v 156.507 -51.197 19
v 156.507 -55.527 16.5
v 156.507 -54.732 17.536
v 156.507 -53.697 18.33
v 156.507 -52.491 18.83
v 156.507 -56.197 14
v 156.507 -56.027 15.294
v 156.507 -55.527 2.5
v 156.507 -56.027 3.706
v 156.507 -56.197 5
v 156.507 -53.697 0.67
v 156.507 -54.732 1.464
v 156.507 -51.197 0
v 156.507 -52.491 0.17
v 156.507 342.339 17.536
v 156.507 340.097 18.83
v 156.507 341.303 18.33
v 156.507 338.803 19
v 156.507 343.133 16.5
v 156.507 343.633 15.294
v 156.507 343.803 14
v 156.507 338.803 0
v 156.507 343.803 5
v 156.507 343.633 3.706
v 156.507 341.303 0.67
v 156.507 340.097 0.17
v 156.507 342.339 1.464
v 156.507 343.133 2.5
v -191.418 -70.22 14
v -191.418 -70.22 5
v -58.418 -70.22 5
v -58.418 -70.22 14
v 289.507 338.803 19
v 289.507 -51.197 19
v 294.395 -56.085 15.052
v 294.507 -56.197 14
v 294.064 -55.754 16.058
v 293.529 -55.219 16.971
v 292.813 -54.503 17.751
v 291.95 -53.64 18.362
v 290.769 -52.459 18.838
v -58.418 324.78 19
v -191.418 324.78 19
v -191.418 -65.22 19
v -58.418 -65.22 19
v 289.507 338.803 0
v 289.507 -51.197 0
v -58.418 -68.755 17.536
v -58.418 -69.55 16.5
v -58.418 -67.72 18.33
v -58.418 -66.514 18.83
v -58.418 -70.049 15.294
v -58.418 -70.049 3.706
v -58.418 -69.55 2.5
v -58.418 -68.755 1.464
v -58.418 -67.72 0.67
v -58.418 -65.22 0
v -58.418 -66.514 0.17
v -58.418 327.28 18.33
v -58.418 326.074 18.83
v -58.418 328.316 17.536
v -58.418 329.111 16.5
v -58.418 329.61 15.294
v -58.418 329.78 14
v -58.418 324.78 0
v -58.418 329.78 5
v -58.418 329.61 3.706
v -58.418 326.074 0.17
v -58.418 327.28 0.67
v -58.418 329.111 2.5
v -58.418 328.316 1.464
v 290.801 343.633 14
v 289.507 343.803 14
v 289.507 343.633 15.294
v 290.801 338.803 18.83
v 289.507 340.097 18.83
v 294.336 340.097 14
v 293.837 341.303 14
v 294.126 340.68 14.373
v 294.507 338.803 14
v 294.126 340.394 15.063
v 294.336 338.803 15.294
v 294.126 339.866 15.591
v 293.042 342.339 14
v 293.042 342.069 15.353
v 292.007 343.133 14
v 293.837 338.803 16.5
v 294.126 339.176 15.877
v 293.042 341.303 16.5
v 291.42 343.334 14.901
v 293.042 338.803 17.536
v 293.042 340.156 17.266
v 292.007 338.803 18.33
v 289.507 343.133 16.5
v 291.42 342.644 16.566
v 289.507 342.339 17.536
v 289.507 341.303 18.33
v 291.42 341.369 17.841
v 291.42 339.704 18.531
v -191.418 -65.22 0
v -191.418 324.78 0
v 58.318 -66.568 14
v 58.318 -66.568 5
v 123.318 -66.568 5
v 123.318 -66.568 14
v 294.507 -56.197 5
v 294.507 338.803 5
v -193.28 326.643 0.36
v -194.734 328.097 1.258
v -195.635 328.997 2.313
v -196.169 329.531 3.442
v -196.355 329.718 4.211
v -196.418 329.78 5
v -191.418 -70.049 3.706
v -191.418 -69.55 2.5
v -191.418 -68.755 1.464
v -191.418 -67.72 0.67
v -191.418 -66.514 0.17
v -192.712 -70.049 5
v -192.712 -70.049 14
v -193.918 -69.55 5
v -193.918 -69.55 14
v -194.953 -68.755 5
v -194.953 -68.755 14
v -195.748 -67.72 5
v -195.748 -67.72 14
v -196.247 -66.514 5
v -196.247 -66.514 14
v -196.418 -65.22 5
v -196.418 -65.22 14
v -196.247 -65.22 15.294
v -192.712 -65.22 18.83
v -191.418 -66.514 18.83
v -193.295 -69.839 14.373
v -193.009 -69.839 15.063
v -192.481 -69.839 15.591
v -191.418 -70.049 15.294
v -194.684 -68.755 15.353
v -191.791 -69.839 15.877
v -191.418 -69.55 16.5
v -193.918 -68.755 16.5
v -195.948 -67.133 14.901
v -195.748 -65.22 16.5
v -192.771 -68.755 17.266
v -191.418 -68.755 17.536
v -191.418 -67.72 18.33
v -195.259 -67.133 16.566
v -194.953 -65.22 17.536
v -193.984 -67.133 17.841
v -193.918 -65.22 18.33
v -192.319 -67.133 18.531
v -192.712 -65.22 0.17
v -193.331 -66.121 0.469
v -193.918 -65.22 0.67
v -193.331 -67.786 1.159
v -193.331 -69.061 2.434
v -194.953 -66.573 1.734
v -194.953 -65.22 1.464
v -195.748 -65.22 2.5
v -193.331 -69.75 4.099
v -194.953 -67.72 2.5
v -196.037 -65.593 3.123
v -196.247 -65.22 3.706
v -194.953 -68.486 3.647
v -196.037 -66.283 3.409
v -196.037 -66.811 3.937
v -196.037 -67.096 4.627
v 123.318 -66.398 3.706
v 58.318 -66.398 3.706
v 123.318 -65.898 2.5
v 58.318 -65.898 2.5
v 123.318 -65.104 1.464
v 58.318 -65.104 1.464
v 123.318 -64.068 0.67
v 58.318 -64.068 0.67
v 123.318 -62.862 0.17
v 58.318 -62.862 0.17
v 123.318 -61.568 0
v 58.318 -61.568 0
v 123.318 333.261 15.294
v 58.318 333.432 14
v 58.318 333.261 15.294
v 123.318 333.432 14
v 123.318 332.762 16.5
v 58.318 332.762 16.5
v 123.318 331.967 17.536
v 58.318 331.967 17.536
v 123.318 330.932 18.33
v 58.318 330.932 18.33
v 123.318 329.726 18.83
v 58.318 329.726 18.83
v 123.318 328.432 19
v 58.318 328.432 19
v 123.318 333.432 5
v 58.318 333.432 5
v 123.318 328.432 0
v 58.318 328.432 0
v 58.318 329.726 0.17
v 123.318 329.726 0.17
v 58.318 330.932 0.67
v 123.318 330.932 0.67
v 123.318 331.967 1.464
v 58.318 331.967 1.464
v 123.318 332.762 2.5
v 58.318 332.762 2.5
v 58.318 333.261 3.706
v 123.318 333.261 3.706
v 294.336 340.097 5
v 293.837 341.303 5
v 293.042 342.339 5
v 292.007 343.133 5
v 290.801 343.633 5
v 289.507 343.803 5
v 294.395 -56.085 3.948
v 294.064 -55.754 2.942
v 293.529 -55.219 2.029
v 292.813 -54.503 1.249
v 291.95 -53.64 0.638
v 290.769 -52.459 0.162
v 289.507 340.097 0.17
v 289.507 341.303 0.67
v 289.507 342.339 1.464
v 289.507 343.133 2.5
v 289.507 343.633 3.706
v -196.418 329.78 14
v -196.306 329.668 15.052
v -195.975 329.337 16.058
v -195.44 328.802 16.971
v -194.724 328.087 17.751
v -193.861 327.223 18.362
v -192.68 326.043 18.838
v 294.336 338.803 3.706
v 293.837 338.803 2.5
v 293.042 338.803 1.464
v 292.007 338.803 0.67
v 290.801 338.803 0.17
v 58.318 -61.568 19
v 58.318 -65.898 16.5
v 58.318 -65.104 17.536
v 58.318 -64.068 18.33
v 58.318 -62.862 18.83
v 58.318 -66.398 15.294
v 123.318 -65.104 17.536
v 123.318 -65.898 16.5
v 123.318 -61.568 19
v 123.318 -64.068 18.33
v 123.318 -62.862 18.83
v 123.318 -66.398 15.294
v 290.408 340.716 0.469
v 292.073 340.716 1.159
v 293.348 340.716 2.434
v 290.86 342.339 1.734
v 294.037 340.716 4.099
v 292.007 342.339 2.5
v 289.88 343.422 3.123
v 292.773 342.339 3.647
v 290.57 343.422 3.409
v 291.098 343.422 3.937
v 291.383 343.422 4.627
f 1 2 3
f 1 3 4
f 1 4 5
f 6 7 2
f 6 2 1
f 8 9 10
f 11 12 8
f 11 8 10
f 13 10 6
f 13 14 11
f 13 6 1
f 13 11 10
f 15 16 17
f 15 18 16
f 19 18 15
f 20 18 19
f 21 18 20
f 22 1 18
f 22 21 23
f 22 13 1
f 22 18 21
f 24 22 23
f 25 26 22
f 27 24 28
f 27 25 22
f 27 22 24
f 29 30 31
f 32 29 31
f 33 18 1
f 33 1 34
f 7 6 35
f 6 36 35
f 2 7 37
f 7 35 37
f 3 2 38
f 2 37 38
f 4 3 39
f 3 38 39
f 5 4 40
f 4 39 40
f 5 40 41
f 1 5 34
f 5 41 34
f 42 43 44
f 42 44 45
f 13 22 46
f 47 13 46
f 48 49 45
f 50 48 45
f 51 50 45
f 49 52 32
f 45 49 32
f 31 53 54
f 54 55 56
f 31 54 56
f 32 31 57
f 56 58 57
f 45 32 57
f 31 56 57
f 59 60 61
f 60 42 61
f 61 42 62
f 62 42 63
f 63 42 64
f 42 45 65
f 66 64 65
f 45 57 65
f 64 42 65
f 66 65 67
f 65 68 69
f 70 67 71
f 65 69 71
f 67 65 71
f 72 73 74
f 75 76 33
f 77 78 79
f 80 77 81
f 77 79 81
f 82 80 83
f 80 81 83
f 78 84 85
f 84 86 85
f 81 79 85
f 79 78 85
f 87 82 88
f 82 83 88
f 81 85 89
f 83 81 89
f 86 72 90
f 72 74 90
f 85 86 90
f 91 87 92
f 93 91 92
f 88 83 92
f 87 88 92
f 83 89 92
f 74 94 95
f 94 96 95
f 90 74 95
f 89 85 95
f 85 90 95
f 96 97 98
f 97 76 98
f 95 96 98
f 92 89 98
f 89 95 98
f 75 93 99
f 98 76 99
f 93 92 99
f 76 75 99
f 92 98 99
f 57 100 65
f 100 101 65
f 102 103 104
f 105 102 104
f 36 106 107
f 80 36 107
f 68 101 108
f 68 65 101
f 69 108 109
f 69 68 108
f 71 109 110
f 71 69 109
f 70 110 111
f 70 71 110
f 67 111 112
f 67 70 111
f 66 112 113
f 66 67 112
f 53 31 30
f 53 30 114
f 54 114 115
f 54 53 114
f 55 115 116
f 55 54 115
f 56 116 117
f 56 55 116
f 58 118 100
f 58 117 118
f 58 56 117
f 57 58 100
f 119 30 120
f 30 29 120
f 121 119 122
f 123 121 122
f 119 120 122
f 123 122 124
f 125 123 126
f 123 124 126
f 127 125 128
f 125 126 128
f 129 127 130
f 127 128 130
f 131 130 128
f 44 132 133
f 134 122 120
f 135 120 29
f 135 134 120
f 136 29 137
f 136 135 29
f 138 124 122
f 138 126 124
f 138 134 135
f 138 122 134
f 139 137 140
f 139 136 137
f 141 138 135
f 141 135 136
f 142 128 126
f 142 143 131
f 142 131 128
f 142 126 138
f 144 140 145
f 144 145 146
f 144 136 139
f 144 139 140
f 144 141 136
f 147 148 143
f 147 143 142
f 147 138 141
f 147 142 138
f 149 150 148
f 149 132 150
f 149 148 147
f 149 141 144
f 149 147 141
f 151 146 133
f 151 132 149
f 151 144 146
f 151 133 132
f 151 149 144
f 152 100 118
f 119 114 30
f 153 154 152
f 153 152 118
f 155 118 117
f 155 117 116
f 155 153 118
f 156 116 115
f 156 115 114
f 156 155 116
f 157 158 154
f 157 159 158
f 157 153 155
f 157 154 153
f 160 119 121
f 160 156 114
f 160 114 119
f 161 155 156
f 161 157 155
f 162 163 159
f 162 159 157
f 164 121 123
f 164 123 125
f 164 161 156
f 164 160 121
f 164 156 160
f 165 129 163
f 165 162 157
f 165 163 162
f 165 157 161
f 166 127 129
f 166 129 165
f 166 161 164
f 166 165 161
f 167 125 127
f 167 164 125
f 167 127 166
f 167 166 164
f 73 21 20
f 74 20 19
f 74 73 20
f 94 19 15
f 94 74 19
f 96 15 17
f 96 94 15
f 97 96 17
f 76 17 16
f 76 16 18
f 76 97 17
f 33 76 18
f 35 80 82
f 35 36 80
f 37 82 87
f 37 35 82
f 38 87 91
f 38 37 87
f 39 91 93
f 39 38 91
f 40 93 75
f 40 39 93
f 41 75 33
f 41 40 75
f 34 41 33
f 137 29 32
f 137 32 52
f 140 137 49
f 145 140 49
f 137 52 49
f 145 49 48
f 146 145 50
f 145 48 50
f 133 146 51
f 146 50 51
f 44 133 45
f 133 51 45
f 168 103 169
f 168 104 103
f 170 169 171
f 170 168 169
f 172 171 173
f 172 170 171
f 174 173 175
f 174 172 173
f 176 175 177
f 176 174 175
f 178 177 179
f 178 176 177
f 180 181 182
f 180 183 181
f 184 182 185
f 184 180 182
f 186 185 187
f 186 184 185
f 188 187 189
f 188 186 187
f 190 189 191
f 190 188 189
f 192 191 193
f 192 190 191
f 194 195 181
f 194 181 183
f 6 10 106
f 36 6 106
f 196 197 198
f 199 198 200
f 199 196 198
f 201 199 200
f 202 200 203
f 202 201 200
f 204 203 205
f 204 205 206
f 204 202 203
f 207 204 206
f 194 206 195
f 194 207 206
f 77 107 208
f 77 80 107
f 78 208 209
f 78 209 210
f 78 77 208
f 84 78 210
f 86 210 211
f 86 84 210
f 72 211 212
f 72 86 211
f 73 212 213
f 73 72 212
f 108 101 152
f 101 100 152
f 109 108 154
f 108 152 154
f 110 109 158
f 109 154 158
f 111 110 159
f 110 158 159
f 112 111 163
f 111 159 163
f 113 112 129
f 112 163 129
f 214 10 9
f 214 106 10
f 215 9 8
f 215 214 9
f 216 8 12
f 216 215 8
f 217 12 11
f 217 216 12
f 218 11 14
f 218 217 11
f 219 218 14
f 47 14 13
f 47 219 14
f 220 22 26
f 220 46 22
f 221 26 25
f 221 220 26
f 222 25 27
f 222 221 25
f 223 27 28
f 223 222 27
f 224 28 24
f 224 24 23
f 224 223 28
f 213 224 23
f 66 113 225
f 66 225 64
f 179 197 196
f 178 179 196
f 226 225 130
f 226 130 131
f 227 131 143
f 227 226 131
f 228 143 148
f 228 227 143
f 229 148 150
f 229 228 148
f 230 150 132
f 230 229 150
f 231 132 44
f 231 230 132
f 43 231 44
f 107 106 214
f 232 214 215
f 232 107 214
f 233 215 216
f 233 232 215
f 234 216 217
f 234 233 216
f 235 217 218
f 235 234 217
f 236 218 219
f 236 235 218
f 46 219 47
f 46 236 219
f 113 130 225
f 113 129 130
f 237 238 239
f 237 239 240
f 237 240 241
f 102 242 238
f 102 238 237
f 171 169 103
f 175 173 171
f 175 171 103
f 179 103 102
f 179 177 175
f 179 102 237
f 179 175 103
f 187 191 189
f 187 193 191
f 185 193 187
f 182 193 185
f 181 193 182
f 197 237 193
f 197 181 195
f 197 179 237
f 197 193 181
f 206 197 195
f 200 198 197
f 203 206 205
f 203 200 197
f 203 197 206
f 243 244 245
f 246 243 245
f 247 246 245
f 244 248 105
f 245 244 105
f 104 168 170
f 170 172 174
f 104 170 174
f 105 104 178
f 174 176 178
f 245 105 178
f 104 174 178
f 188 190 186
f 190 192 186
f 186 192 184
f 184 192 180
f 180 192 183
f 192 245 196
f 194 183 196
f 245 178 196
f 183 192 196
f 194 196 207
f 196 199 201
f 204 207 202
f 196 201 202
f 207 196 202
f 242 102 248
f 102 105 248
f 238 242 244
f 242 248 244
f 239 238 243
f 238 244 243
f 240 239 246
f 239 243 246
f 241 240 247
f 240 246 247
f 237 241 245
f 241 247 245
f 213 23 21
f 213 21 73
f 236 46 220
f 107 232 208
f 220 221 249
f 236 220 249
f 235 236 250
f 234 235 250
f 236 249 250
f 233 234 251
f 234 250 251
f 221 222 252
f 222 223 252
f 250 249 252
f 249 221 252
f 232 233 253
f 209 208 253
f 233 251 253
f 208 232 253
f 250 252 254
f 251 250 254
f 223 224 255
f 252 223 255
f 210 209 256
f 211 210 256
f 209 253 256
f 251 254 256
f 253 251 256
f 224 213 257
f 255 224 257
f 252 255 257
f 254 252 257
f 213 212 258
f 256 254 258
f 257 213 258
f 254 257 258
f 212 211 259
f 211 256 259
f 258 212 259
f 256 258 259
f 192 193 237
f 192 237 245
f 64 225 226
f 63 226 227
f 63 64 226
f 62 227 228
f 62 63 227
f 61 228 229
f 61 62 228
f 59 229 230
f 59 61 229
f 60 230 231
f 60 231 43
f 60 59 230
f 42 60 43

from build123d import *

# Parameters (mm, degrees)
F0_W     = 138
F0_H     = 400
F0_W_2   = 65
F1_DEPTH = 19
F2_R     = 5
F3_R     = 5


with BuildPart() as f1:
    # F0 (on Top) → F1 (new body)
    with BuildSketch(Plane.XY):
        with Locations((-127.417857, 129.780379)):
            Rectangle(F0_W, F0_H)
        with Locations((90.818478, 133.431737)):
            Rectangle(F0_W_2, F0_H)
        with Locations((225.506747, 143.803065)):
            Rectangle(F0_W, F0_H)
    extrude(amount=F1_DEPTH)

    # F2
    f2_edges = [f1.edges().sort_by_distance(p)[0] for p in [
        (-196.417857, 129.780379, 19),
        (-127.417857, 329.780379, 19),
        (90.818478, 333.431737, 19),
        (225.506747, 343.803065, 19),
        (294.506747, 143.803065, 0),
        (225.506747, -56.196935, 0),
        (90.818478, -66.568263, 0),
        (-127.417857, -70.219621, 0),
    ]]
    fillet(f2_edges, radius=F2_R)

    # F3
    f3_edges = [f1.edges().sort_by_distance(p)[0] for p in [
        (-124.917857, -70.219621, 19),
        (-196.417857, 132.280379, 0),
        (-127.417857, 329.780379, 0),
        (90.818478, 333.431737, 0),
        (90.818478, -66.568263, 19),
        (223.006747, 343.803065, 0),
        (294.506747, 141.303065, 19),
        (225.506747, -56.196935, 19),
    ]]
    fillet(f3_edges, radius=F3_R)


solid = f1.part
